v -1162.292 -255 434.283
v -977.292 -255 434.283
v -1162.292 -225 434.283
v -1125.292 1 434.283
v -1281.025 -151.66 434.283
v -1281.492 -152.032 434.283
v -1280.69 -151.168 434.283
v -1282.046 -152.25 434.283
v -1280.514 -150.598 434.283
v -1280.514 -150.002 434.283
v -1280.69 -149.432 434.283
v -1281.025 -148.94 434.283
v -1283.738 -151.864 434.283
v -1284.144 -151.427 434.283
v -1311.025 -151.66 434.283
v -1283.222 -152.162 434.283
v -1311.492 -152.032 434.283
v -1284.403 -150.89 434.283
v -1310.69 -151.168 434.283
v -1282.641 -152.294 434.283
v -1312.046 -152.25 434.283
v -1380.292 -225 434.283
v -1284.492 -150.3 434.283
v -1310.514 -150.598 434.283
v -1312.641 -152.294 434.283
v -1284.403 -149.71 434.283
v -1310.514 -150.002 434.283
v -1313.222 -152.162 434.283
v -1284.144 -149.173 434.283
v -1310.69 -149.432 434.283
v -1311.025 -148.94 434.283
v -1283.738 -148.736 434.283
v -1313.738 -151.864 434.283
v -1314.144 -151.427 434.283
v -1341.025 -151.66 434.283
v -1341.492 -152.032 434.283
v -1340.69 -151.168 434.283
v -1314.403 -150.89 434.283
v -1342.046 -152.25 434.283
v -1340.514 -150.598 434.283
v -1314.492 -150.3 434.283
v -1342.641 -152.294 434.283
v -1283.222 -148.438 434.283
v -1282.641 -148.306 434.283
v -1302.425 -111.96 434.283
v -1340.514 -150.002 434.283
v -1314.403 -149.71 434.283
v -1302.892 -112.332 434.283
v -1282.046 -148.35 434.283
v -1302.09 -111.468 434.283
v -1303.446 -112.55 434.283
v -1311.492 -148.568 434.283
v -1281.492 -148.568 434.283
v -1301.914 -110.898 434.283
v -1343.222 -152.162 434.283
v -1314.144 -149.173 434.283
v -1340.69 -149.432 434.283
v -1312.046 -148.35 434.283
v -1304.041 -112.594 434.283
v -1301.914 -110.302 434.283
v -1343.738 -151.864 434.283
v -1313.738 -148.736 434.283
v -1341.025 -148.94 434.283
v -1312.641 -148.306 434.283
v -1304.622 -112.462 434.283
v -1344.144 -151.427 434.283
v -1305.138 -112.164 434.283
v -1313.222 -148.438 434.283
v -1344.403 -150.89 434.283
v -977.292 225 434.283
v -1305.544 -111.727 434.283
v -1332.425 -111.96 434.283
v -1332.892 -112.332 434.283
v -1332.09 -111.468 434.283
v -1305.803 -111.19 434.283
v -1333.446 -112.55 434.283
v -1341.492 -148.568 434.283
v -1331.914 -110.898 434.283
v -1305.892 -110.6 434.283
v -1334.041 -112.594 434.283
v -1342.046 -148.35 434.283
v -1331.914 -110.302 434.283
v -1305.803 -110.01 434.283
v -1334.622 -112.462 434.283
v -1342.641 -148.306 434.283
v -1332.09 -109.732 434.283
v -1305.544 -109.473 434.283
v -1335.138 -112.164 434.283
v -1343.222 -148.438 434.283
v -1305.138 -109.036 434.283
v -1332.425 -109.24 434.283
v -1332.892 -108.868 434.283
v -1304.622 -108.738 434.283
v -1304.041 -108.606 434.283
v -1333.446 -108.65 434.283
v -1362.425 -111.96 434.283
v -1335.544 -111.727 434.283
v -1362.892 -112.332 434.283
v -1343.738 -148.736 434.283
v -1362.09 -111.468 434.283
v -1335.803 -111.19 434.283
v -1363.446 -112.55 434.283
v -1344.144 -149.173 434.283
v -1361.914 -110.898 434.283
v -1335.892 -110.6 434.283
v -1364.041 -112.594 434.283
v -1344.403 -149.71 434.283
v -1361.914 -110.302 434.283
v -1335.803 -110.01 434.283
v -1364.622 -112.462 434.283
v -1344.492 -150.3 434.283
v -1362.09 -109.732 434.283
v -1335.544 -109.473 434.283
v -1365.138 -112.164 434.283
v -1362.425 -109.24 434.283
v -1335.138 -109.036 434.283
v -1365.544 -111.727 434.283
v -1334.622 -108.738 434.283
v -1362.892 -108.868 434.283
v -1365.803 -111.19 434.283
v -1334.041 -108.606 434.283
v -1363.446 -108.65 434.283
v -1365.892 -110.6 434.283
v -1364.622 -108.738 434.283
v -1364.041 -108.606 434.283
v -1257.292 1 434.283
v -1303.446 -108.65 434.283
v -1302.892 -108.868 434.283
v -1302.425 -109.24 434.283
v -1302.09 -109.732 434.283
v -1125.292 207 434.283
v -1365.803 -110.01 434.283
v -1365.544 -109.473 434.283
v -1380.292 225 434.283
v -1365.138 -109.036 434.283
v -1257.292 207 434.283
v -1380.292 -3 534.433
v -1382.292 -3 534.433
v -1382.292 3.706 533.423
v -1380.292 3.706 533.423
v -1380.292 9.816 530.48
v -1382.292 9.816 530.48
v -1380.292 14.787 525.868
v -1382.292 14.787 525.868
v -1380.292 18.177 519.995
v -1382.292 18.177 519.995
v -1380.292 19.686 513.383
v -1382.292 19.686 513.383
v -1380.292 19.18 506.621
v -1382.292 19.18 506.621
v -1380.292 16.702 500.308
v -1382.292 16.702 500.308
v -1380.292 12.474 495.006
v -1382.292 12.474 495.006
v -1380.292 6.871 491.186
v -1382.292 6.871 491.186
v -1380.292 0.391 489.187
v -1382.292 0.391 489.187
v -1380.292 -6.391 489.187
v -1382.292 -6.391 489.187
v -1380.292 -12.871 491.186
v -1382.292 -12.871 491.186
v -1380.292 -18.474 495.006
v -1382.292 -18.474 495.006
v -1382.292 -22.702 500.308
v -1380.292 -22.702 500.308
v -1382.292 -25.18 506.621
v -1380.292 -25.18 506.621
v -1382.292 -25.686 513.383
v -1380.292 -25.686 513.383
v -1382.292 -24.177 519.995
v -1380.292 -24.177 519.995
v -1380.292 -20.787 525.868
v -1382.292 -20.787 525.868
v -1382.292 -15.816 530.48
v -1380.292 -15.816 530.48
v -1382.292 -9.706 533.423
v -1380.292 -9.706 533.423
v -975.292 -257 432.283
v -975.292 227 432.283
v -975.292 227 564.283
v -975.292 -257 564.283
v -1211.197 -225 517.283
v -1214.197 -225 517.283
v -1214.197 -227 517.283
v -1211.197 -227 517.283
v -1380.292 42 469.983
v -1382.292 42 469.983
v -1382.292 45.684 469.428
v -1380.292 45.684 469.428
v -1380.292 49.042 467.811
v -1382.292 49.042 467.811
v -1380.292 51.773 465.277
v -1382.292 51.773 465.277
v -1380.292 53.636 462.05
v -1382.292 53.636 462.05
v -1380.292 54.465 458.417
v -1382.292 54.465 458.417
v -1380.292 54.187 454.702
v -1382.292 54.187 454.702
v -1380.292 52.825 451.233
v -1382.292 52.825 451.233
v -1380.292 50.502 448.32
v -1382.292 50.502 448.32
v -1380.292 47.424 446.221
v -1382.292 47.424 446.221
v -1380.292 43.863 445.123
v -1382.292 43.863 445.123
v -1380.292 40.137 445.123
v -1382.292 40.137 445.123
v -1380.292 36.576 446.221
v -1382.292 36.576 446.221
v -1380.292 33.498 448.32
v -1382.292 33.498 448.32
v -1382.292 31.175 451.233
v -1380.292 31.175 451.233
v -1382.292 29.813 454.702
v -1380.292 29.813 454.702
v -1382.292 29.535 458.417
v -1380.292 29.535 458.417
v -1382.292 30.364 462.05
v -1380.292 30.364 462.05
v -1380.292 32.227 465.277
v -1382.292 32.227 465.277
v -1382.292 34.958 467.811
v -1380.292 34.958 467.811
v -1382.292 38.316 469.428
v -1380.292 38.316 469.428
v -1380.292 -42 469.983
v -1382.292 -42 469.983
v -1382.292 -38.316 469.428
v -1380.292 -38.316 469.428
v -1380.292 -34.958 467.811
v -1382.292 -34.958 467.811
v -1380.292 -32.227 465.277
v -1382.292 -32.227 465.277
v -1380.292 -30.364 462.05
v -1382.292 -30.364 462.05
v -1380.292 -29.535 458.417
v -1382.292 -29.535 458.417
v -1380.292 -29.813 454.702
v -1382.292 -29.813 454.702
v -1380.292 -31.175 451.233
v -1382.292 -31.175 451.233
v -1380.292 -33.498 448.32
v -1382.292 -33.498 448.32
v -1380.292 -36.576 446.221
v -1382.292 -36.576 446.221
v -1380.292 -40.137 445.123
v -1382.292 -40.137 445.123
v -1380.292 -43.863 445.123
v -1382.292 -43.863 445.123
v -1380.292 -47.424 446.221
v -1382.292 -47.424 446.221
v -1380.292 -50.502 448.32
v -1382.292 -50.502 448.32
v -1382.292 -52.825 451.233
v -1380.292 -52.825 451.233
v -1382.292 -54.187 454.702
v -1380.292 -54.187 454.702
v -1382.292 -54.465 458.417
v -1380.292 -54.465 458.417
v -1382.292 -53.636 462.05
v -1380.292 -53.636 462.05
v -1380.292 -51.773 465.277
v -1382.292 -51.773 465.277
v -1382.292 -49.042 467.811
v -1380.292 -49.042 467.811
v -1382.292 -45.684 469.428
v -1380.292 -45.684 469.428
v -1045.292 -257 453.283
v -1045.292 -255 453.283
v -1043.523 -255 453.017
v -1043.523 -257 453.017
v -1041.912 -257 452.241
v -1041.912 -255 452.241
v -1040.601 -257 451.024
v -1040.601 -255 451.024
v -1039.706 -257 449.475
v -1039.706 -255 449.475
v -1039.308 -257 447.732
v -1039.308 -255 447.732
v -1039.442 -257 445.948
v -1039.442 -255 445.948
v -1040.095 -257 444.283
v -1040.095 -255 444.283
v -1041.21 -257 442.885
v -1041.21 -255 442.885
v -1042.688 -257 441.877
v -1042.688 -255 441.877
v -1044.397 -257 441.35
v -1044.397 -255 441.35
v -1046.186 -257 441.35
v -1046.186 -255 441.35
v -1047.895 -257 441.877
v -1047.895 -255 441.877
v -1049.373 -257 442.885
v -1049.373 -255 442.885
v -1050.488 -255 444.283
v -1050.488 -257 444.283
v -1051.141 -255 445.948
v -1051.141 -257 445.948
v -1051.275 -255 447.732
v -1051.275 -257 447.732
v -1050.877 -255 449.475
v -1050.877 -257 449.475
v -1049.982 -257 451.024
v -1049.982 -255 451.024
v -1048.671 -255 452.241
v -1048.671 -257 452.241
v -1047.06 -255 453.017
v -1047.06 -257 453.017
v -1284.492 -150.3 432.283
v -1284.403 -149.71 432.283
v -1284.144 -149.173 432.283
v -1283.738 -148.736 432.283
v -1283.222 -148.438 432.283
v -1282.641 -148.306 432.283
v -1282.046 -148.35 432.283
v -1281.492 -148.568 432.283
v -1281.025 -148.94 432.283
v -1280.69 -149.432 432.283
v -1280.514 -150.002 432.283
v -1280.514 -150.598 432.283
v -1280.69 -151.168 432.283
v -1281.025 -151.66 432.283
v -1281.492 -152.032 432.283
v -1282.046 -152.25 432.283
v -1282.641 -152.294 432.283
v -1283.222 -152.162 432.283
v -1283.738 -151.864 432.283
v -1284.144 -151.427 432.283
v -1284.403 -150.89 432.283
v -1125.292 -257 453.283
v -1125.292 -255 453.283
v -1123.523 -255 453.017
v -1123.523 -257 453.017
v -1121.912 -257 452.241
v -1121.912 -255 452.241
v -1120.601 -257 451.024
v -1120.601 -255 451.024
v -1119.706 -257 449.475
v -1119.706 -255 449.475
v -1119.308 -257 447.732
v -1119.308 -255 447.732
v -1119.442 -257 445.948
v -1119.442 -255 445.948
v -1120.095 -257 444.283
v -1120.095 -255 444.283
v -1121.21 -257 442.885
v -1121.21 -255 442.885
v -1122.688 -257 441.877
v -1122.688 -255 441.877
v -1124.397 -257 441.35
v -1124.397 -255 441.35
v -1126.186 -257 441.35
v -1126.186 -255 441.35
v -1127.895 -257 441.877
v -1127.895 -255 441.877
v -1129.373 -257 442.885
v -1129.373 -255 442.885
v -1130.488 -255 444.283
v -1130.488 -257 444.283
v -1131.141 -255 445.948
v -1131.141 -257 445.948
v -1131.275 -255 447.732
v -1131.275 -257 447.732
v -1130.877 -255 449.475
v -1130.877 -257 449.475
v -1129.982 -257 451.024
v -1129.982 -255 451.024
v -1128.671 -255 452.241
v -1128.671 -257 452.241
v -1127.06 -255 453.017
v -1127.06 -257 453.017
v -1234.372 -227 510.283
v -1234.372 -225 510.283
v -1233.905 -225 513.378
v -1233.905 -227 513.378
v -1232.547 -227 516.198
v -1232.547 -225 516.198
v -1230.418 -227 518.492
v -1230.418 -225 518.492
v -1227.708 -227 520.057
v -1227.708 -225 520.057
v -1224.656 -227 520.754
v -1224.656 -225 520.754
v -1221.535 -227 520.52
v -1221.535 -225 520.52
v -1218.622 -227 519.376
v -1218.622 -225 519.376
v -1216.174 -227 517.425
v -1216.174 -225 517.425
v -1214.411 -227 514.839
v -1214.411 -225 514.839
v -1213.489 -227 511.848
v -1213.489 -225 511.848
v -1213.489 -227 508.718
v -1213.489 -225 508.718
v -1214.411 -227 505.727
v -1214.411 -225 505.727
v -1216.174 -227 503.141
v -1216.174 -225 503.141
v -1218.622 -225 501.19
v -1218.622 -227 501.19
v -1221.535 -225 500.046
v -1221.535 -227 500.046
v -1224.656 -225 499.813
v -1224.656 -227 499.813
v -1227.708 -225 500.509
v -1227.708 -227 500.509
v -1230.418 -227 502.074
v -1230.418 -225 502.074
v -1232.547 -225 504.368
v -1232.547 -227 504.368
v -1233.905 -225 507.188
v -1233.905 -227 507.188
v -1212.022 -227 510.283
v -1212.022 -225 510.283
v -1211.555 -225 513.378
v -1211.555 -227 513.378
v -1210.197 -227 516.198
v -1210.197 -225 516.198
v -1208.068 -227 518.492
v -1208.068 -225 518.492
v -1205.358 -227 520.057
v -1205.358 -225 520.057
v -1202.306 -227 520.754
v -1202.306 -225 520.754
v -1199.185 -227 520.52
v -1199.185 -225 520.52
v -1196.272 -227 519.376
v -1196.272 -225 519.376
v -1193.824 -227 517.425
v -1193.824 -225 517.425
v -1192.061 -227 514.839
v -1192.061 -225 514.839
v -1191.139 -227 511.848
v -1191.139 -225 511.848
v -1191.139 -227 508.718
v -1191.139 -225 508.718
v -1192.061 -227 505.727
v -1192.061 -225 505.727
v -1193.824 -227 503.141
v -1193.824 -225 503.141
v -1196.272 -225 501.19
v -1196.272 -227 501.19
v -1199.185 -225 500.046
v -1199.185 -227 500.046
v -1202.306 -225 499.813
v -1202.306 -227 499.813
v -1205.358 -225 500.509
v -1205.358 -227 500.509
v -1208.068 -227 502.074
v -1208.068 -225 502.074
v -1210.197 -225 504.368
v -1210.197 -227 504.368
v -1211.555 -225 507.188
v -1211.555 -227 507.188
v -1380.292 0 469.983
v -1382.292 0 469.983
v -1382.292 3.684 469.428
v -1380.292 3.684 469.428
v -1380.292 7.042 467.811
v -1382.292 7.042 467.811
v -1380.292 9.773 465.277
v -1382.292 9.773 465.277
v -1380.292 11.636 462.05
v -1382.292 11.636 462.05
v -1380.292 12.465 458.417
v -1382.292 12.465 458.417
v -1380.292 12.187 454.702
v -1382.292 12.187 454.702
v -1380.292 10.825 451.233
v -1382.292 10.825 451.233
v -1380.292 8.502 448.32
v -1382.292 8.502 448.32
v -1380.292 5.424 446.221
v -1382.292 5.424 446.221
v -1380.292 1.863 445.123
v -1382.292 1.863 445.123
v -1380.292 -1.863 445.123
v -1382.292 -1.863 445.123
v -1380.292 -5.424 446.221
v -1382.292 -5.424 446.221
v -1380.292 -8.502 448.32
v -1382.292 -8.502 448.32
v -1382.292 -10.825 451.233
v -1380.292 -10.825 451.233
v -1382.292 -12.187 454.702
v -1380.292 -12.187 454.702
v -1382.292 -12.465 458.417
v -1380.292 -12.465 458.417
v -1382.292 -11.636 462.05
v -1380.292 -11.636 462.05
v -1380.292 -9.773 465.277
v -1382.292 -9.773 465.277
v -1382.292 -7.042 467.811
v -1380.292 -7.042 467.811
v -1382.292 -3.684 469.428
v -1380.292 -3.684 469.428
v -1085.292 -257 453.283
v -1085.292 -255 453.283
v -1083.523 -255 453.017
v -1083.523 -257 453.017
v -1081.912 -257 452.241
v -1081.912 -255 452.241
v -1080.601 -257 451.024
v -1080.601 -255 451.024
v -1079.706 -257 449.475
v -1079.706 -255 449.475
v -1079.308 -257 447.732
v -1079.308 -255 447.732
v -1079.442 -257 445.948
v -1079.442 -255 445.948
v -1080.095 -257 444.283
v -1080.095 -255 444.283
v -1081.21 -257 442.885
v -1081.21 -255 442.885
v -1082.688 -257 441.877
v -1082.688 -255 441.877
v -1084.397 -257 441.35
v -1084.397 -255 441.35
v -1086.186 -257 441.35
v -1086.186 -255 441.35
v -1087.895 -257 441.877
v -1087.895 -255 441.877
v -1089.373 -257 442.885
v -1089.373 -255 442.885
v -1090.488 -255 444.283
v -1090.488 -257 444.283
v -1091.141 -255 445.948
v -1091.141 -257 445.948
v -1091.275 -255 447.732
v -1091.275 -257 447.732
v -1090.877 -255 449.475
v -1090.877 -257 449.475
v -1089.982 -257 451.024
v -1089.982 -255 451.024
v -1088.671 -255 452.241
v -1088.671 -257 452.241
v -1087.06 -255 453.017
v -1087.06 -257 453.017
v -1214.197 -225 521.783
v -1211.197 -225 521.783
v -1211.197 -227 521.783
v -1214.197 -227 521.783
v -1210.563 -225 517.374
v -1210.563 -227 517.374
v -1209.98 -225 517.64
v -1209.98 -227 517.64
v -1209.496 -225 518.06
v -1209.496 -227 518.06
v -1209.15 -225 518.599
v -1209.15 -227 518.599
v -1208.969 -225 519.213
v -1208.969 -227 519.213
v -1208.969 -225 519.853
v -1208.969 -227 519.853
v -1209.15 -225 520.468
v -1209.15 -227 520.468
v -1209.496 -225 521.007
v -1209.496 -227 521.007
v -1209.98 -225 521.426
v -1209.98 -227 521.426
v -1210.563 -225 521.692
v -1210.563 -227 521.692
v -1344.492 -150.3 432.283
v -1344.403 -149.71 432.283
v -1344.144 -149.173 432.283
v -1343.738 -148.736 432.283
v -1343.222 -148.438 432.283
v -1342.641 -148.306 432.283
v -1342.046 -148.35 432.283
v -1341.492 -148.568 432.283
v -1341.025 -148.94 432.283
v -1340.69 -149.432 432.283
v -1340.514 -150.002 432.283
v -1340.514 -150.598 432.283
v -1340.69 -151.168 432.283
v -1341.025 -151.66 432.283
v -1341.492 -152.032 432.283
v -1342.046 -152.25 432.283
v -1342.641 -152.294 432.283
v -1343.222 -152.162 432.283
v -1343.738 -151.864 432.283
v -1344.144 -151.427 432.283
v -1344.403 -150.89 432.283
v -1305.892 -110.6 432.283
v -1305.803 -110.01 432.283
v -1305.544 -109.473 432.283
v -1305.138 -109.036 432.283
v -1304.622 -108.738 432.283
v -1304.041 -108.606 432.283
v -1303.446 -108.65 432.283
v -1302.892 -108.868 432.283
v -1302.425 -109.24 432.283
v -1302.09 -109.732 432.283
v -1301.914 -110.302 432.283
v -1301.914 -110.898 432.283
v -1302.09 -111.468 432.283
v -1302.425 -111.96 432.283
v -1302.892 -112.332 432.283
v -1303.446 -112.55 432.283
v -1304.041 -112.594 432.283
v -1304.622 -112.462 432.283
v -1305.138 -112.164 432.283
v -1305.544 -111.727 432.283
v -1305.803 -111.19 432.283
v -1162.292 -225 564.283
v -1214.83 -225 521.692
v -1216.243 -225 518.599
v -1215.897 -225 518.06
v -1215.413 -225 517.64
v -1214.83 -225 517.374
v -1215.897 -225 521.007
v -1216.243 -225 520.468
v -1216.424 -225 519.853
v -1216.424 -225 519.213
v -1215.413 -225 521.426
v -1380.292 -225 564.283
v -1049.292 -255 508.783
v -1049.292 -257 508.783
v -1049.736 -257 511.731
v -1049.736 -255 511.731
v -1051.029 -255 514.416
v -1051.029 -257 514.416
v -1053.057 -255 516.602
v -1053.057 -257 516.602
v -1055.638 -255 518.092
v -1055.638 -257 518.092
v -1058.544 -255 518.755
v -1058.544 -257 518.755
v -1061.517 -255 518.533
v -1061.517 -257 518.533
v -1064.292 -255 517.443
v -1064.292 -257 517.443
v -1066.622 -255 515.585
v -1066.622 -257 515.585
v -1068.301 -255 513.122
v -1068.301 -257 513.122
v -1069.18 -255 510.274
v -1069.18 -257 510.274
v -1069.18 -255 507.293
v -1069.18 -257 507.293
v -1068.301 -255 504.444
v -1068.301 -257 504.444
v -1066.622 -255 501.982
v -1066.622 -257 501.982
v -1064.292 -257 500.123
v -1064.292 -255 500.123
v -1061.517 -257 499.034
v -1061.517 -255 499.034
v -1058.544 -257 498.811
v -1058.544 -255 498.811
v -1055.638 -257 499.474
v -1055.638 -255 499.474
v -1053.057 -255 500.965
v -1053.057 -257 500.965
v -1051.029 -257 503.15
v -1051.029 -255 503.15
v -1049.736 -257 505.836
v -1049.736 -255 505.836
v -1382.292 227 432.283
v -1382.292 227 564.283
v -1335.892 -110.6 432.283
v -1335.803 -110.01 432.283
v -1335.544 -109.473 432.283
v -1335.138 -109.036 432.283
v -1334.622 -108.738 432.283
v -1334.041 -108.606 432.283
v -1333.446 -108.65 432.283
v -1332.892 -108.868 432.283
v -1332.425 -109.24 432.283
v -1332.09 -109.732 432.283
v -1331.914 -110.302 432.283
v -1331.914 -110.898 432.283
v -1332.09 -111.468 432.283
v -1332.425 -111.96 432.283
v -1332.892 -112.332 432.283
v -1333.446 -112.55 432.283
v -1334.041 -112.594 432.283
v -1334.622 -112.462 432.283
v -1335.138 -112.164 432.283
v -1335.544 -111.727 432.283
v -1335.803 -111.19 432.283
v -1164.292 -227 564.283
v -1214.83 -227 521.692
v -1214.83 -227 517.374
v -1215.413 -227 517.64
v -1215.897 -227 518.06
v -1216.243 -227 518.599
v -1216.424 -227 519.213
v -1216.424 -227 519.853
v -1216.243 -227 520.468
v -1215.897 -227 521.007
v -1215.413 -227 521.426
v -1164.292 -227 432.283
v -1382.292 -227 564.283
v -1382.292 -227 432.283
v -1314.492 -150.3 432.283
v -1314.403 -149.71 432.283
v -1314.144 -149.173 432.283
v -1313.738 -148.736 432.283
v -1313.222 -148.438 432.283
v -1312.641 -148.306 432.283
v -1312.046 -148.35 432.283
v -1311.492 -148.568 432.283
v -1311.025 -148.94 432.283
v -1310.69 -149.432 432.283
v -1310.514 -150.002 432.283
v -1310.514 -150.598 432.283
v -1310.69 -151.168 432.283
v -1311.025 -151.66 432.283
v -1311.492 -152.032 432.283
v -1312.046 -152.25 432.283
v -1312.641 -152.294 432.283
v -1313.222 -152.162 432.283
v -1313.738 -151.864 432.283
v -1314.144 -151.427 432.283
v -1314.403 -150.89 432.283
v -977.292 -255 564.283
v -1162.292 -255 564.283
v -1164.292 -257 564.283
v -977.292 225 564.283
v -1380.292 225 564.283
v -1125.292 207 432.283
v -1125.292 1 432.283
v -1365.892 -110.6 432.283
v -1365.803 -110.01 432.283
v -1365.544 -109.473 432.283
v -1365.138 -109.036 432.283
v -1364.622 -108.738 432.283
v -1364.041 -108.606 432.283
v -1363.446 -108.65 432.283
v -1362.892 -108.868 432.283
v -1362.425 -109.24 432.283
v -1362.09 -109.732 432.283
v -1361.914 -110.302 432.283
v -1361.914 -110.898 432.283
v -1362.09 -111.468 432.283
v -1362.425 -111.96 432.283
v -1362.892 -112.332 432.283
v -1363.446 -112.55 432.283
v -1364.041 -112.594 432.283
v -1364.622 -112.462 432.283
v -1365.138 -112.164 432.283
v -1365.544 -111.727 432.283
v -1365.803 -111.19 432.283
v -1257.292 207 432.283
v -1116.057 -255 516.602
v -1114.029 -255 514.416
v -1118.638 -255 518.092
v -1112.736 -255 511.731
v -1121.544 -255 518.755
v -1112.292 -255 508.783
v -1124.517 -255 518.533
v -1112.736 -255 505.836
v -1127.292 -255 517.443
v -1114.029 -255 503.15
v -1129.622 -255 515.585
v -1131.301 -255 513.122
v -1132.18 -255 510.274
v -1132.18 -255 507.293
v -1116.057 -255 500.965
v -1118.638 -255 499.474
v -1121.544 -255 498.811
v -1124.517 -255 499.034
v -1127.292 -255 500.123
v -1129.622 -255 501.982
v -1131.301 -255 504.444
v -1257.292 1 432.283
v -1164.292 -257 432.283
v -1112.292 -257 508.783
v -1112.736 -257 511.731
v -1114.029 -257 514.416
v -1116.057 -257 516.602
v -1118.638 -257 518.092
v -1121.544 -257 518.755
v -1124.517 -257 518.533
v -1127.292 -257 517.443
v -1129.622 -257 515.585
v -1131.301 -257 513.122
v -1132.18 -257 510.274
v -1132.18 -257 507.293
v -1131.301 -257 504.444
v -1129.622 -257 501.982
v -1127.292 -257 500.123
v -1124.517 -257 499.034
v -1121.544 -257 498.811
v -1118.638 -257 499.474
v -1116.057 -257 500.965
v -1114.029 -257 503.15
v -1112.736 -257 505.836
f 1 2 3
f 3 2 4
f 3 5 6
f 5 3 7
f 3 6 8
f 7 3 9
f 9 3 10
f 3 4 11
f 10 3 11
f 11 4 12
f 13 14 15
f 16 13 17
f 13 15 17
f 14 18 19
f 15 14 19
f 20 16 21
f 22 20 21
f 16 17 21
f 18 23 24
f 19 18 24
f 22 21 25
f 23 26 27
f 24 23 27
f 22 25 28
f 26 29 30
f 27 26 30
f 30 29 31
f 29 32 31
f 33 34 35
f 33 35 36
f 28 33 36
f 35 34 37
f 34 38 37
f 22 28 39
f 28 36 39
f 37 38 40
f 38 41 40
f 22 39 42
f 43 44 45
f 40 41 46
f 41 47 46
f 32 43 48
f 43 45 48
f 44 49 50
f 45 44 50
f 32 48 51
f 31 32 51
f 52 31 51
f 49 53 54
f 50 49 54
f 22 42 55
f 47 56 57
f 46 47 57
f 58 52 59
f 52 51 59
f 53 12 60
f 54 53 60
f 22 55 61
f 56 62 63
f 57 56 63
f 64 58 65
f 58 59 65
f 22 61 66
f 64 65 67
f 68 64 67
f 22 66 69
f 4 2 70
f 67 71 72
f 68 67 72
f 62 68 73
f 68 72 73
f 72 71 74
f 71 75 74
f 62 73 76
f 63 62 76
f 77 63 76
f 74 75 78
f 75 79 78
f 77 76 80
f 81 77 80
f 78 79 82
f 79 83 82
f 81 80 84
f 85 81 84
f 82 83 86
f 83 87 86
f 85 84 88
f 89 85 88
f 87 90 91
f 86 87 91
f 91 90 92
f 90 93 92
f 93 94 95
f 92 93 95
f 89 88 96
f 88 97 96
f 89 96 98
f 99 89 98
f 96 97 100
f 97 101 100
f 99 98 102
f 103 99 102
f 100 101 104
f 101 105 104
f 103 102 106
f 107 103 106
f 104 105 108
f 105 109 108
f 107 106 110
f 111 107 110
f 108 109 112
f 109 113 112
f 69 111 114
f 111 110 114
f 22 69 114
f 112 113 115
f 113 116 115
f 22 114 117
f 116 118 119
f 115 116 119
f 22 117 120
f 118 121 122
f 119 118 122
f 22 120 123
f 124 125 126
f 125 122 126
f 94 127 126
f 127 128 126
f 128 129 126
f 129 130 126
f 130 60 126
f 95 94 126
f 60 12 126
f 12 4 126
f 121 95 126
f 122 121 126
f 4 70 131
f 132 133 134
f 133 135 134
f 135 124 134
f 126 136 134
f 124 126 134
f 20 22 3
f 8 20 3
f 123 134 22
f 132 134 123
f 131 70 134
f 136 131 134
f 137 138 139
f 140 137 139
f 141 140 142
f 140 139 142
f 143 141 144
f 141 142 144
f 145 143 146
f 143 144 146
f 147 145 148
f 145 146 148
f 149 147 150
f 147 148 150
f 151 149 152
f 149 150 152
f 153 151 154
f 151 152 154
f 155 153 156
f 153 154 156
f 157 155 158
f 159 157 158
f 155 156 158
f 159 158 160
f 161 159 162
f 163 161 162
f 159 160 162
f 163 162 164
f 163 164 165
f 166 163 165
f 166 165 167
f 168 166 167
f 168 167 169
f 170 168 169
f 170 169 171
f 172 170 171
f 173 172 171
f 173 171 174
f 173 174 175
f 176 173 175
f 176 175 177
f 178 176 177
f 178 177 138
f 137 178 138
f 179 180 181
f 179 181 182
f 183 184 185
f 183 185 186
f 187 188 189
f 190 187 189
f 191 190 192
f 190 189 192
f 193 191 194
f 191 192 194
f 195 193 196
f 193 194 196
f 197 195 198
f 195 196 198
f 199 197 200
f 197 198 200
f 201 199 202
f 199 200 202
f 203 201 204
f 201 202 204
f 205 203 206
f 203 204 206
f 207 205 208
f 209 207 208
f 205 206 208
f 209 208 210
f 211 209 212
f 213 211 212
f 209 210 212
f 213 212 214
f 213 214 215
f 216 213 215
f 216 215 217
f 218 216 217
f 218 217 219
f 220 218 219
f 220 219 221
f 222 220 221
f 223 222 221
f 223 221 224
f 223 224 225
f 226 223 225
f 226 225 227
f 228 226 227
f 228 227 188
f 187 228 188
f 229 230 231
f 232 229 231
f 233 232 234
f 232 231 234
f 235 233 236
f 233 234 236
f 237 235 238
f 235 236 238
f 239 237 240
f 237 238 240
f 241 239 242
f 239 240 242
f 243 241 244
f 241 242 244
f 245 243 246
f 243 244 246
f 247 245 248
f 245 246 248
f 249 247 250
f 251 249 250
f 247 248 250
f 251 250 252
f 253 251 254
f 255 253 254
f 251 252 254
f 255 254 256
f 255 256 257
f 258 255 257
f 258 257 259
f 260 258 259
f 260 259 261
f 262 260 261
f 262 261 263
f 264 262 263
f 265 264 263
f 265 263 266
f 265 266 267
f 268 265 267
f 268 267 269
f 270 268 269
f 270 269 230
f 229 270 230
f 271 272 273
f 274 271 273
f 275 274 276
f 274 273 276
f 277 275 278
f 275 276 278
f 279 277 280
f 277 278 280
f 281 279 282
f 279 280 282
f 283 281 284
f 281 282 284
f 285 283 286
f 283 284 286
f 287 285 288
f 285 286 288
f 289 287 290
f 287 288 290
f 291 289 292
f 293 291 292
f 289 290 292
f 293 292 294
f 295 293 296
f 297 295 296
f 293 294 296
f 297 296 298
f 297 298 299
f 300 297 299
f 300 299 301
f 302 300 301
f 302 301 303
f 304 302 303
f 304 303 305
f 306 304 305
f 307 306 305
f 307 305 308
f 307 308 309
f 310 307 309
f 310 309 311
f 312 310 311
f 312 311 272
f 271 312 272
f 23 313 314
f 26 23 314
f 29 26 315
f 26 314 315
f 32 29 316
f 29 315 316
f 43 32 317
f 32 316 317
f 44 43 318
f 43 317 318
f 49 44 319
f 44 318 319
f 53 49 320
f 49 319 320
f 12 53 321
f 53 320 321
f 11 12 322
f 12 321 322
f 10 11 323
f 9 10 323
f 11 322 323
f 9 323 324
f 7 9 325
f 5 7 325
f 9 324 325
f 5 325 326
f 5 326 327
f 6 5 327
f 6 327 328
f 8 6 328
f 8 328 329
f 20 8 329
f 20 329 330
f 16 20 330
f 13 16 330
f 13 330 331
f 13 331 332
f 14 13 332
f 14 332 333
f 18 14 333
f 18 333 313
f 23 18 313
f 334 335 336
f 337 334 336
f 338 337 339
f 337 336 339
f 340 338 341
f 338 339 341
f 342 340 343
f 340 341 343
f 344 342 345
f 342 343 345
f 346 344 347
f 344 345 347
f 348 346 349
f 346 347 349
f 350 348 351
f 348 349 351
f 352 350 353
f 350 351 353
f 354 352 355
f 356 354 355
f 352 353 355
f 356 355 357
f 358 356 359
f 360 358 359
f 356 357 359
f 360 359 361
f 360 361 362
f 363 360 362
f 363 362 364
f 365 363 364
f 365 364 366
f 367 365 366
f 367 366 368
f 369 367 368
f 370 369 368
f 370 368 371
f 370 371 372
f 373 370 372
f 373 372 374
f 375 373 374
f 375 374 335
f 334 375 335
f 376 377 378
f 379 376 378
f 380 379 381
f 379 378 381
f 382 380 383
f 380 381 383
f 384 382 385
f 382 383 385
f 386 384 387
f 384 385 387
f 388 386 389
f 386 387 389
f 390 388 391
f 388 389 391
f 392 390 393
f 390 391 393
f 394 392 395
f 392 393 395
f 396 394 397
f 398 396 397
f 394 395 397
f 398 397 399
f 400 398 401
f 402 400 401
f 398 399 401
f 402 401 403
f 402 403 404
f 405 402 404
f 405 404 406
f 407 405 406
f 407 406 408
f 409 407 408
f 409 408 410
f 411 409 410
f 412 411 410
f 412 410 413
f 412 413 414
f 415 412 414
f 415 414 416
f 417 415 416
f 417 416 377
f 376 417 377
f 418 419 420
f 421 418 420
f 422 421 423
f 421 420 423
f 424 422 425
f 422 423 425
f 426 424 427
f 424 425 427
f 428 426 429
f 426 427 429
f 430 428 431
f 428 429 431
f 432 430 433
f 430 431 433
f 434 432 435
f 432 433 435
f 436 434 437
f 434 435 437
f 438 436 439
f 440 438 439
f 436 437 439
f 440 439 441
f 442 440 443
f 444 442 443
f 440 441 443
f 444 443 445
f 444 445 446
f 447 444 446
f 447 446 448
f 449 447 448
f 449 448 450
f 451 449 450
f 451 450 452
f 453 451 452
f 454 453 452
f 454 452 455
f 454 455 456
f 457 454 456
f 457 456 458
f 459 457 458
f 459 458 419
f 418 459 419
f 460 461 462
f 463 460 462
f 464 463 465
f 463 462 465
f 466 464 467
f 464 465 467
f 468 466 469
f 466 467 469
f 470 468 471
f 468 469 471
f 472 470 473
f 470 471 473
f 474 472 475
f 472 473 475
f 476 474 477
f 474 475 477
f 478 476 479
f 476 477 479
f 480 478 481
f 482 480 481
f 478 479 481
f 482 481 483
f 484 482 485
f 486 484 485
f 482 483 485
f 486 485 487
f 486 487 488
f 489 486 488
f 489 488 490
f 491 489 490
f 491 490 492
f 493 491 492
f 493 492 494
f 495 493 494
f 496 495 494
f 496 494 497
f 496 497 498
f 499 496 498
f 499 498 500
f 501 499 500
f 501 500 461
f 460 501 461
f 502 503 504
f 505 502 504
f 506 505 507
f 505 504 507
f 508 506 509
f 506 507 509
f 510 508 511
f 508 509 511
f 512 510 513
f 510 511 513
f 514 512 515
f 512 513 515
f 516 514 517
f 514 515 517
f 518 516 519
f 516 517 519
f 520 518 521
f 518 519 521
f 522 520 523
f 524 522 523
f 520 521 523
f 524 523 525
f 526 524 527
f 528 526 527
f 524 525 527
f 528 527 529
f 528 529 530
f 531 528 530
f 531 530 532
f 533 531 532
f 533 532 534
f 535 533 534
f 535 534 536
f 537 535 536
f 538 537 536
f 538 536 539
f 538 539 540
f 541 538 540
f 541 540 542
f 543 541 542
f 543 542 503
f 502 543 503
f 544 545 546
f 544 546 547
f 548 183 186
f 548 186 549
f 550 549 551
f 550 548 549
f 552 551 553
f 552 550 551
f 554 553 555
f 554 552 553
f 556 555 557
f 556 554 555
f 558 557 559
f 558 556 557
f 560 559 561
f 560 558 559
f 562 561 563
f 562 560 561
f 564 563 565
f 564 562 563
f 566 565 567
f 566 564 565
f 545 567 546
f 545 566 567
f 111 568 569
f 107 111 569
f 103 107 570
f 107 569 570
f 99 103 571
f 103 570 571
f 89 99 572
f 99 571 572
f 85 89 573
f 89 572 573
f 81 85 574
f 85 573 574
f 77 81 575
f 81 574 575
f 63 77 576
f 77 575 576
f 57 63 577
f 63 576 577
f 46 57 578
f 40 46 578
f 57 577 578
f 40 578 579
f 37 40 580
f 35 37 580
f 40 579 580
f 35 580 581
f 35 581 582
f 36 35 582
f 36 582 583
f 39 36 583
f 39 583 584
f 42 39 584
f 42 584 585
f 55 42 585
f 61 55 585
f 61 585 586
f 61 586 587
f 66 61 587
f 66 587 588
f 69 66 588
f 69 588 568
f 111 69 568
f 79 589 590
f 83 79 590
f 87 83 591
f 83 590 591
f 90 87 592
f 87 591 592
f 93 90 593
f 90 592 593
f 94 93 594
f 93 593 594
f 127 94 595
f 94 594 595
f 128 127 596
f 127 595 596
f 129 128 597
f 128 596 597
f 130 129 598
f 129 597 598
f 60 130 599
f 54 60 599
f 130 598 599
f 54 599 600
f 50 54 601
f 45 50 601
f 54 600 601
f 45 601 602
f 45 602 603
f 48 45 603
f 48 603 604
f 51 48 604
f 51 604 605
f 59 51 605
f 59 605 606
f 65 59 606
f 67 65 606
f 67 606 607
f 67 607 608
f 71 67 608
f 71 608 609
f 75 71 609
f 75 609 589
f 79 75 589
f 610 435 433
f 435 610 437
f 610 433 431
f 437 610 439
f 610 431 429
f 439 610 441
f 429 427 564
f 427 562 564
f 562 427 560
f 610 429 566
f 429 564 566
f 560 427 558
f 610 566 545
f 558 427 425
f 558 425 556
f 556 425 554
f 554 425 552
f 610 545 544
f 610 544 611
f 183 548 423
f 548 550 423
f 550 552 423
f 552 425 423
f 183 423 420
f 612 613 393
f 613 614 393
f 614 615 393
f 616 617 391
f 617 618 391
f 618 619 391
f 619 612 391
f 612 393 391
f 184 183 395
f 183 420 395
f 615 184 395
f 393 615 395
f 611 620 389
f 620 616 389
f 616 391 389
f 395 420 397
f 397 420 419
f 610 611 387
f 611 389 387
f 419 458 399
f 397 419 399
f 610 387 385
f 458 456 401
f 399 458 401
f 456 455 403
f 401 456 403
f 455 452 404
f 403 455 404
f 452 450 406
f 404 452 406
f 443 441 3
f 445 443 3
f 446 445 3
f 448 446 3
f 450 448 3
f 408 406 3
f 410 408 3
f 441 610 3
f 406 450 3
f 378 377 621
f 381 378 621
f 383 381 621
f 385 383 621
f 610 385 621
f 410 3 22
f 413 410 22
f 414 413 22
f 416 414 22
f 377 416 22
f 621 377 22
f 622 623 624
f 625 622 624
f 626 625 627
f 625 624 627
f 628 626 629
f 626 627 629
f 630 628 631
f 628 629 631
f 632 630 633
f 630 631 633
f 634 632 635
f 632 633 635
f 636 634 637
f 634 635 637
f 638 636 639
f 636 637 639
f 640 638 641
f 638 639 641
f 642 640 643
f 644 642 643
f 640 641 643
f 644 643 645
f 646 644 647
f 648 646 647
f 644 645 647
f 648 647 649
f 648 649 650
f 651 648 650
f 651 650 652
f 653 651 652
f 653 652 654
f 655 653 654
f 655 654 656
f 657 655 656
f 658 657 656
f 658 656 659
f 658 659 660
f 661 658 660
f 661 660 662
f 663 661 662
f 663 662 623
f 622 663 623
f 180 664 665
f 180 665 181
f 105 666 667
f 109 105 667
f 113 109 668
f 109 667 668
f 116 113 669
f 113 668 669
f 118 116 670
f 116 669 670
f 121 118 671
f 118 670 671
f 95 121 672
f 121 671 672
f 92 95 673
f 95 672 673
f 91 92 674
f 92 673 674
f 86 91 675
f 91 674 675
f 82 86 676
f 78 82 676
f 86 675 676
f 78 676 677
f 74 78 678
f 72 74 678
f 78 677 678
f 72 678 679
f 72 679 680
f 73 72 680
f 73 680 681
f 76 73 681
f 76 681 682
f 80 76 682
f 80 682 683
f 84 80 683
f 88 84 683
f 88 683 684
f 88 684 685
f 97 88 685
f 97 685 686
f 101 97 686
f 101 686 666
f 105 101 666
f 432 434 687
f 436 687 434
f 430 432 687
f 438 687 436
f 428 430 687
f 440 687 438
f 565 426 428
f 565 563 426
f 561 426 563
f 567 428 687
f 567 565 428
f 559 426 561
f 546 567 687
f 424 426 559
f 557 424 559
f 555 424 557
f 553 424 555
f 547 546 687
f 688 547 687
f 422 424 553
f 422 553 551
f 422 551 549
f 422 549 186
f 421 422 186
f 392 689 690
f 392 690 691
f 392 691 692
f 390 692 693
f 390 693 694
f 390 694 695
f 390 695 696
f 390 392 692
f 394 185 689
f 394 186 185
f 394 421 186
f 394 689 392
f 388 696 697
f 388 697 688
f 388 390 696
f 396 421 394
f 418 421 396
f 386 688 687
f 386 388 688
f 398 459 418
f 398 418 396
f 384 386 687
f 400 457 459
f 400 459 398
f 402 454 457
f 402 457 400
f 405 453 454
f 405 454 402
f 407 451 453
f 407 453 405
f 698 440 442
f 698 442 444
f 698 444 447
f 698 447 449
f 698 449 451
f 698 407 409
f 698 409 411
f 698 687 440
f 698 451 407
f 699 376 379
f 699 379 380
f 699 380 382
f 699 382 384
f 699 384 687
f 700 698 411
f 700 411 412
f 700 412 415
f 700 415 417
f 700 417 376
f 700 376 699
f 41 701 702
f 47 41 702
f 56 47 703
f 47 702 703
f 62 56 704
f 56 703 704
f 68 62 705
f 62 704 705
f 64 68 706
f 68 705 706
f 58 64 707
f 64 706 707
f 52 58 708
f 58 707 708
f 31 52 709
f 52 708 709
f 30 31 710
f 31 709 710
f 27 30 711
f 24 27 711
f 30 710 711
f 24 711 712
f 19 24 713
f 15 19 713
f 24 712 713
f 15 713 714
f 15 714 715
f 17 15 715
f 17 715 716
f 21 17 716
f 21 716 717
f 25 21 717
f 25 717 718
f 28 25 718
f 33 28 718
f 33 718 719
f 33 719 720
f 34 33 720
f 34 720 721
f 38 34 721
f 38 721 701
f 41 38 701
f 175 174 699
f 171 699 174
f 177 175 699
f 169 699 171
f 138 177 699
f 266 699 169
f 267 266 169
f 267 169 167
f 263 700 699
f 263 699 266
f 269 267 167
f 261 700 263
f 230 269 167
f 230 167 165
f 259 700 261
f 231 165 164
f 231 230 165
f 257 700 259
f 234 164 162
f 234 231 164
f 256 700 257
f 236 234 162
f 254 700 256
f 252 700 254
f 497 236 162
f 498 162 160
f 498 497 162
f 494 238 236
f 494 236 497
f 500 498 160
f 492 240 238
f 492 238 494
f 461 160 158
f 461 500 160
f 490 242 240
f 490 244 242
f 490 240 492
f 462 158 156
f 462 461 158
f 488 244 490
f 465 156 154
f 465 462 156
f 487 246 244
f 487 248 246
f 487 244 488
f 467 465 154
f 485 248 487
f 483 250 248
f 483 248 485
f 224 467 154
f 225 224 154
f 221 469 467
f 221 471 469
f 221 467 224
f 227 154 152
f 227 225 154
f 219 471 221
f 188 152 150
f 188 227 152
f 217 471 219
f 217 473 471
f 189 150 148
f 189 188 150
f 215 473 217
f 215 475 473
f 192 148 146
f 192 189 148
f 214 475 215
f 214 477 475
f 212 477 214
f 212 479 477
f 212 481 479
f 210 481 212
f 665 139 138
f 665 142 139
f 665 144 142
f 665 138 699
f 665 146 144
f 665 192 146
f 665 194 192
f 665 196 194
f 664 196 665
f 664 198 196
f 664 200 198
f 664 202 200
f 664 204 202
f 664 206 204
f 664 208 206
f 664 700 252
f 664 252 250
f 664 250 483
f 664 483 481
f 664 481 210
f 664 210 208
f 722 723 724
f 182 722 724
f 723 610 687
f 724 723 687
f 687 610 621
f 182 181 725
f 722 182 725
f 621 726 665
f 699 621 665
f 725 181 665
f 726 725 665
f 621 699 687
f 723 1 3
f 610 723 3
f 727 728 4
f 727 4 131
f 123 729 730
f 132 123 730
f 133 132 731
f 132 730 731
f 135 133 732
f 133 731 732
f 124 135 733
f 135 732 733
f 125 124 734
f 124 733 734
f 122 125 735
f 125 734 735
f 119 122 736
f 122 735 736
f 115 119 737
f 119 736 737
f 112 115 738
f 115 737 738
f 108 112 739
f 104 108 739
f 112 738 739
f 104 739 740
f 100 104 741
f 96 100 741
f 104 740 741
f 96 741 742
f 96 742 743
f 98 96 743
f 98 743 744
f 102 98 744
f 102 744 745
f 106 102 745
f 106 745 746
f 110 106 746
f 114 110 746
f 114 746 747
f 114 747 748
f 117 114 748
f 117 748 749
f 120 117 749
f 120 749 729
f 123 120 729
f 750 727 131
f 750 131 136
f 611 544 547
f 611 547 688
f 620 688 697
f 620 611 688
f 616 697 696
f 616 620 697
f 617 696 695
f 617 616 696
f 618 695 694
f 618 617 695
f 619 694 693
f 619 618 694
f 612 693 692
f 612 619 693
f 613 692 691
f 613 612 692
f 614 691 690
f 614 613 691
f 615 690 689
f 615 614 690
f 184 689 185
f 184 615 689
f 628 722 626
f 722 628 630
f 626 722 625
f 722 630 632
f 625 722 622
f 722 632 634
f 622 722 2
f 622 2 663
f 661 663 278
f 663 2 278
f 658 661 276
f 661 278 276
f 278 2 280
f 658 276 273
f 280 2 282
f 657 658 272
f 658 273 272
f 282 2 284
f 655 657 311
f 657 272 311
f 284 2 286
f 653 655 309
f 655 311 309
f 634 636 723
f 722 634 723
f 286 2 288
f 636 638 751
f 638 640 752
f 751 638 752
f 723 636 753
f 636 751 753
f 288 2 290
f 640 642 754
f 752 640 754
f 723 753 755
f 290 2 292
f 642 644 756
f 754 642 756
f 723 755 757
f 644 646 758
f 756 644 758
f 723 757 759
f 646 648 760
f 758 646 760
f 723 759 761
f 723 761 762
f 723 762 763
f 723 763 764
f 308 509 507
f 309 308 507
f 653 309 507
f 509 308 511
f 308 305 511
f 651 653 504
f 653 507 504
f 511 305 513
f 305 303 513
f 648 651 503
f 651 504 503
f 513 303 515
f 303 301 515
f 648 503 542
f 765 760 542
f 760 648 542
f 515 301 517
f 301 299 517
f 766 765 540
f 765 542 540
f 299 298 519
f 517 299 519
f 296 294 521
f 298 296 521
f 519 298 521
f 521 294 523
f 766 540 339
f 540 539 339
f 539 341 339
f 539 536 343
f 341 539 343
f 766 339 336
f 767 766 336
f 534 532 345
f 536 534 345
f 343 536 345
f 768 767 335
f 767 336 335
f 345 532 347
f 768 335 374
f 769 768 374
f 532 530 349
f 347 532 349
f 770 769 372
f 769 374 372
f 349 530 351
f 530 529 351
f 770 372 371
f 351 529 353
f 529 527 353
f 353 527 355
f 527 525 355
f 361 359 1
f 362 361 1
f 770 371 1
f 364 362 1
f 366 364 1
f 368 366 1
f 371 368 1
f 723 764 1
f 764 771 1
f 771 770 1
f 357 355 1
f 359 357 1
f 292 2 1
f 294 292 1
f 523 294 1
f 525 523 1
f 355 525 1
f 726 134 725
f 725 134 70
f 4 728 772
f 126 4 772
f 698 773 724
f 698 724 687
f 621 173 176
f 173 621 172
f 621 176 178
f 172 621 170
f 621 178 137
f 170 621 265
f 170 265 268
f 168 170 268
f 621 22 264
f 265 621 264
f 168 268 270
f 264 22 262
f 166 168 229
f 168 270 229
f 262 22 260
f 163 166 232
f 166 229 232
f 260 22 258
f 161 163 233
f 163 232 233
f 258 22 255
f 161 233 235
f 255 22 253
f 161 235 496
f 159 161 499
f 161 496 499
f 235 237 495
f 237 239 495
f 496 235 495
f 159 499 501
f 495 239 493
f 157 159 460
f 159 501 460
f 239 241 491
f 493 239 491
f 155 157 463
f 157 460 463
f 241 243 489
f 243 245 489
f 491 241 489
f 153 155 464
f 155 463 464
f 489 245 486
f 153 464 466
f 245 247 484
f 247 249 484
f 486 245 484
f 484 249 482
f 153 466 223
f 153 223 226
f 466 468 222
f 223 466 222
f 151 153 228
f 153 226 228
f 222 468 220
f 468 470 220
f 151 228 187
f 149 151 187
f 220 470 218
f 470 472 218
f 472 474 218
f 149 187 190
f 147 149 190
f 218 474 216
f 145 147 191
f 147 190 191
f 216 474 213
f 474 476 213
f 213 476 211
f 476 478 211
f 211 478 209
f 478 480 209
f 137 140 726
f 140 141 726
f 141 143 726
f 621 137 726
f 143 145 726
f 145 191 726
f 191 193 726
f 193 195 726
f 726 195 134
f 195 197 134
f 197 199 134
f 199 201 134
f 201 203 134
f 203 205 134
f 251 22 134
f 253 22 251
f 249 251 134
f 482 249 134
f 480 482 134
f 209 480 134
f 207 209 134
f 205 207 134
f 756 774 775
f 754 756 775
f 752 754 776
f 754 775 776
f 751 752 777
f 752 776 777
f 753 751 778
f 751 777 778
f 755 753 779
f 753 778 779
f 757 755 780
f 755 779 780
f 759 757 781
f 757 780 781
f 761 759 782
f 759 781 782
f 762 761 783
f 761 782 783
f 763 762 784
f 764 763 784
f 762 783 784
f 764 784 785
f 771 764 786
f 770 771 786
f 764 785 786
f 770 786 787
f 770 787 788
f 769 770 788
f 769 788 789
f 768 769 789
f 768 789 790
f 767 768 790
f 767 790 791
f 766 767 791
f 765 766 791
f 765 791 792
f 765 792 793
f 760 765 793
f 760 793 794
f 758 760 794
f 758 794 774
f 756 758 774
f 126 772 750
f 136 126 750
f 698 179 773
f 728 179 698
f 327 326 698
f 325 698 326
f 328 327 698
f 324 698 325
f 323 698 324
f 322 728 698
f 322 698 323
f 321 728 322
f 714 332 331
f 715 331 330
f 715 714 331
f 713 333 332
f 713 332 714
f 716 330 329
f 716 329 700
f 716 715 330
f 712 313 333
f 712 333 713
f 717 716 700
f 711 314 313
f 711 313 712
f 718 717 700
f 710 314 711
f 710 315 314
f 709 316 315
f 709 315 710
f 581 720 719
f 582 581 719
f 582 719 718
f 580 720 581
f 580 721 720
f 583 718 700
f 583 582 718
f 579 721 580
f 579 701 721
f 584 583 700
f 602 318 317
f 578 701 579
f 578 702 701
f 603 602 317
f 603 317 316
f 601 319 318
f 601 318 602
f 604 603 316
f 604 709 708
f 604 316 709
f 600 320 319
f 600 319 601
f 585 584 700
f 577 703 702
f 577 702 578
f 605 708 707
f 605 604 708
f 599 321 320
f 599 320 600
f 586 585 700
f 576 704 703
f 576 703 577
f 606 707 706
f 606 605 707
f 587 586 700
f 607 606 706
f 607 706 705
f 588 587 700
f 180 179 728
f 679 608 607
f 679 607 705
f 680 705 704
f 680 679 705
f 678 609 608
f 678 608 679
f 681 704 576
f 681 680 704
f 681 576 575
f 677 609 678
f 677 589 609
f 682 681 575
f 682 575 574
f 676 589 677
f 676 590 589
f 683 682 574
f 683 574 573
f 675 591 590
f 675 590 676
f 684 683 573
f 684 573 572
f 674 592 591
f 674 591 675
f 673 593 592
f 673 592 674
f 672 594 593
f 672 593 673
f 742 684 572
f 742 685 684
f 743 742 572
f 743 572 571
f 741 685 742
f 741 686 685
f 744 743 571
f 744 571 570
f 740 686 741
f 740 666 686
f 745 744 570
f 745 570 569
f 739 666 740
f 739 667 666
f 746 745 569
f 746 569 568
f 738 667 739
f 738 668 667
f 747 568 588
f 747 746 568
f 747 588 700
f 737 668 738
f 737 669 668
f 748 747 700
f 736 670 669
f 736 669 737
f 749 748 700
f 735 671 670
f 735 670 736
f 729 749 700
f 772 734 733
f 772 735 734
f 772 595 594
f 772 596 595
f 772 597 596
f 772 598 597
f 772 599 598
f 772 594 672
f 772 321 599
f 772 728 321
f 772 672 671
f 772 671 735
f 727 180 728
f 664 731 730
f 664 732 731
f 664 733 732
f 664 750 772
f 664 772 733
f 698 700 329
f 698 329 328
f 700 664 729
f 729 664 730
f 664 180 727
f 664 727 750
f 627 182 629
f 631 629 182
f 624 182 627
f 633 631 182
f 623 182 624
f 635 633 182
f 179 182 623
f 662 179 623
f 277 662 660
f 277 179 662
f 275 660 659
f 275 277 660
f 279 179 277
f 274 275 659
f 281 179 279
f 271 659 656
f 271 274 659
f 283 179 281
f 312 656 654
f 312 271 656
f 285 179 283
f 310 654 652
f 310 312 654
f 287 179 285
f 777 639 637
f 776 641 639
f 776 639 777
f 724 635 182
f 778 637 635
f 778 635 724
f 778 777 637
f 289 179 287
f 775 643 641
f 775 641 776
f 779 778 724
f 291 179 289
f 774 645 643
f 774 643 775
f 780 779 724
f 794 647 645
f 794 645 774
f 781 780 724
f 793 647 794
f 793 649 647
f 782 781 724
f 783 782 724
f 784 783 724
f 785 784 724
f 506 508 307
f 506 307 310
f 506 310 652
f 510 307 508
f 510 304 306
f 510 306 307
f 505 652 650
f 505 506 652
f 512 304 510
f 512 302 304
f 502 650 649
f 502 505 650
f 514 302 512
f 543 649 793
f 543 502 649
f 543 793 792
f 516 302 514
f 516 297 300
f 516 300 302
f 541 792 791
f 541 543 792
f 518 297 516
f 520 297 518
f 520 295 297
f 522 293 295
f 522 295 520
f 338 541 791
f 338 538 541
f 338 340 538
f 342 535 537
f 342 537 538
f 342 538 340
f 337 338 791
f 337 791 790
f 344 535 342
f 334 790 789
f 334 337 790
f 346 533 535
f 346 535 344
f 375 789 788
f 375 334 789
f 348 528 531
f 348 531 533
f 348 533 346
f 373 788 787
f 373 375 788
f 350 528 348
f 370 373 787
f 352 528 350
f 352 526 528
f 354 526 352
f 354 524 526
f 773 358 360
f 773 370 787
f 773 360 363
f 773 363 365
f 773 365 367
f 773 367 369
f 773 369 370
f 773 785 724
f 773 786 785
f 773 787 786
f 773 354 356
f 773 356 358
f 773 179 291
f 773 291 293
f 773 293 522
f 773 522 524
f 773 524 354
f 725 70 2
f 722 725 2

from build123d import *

# Parameters (mm, degrees)
DODANIE_WYCI_GNI_CIE1_DEPTH     = 130
SKORUPA1_T                      = 2
WYTNIJ_WYCI_GNI_CIE1_REACH      = 1414.162
SZKIC6_W                        = 132
SZKIC6_H                        = 206
OTWORY_USTALAJ_CE_12_0MM1_D     = 12
OTWORY_USTALAJ_CE_12_0MM1_DEPTH = 2
SZKIC10_R                       = 12.5
SZKIC10_R_2                     = 22.75
WYTNIJ_WYCI_GNI_CIE2_DEPTH      = 10
SZKIC8_R                        = 10
WYTNIJ_WYCI_GNI_CIE3_DEPTH      = 10
SZKIC11_R                       = 2
WYTNIJ_WYCI_GNI_CIE4_DEPTH      = 10
SZKIC12_R                       = 10.5
WYTNIJ_WYCI_GNI_CIE5_DEPTH      = 10


with BuildPart() as part:
    # Szkic1 → Dodanie-wyciągnięcie1 (new body)
    with BuildSketch(Plane.XY.offset(434.283231707)):
        Polygon((-977.291509632, 225), (-977.291509632, -255), (-1162.291509632, -255), (-1162.291509632, -225), (-1380.291509632, -225), (-1380.291509632, 225), align=None)
    extrude(amount=DODANIE_WYCI_GNI_CIE1_DEPTH)

    # Skorupa1
    skorupa1_openings = [part.faces().sort_by_distance(p)[0] for p in [
        (-1175.554752008, -7.126805778, 564.283231707),
    ]]
    offset(amount=SKORUPA1_T, openings=skorupa1_openings, kind=Kind.INTERSECTION)

    # Szkic6 → Wytnij-wyciągnięcie1 (cut, up to next)
    with BuildSketch(Plane(origin=(0, 0, 432.283231707), x_dir=(-1, 0, 0), z_dir=(0, 0, -1)), mode=Mode.PRIVATE) as wytnij_wyci_gni_cie1_sk1:
        with Locations((1191.291509632, 104)):
            Rectangle(SZKIC6_W, SZKIC6_H)
    wytnij_wyci_gni_cie1_tool1 = extrude(wytnij_wyci_gni_cie1_sk1.sketch, amount=-WYTNIJ_WYCI_GNI_CIE1_REACH, mode=Mode.PRIVATE) & part.part
    add(wytnij_wyci_gni_cie1_tool1.solids().sort_by_distance((-1191.29151, 104, 432.283232))[0], mode=Mode.SUBTRACT)

    # Otwory ustalające Ø12.0mm1
    with Locations(Plane(origin=(-1125.291509632, -257, 447.283231707), x_dir=(0, 0, -1), z_dir=(0, -1, 0))):
        with Locations((0, 0), (0, 40), (0, 80)):
            Hole(OTWORY_USTALAJ_CE_12_0MM1_D / 2, depth=OTWORY_USTALAJ_CE_12_0MM1_DEPTH)

    # Szkic10 → Wytnij-wyciągnięcie2 (cut)
    with BuildSketch(Plane.ZY.offset(1382.291509632)):
        with Locations((457.483231707, 42)):
            Circle(SZKIC10_R)
        with Locations((457.483231707, 0)):
            Circle(SZKIC10_R)
        with Locations((457.483231707, -42)):
            Circle(SZKIC10_R)
        with Locations((511.683231707, -3)):
            Circle(SZKIC10_R_2)
    extrude(amount=-WYTNIJ_WYCI_GNI_CIE2_DEPTH, mode=Mode.SUBTRACT)

    # Szkic8 → Wytnij-wyciągnięcie3 (cut)
    with BuildSketch(Plane.XZ.offset(257)):
        with Locations((-1122.291509632, 508.783231707)):
            Circle(SZKIC8_R)
        with Locations((-1059.291509632, 508.783231707)):
            Circle(SZKIC8_R)
    extrude(amount=-WYTNIJ_WYCI_GNI_CIE3_DEPTH, mode=Mode.SUBTRACT)

    # Szkic11 → Wytnij-wyciągnięcie4 (cut)
    with BuildSketch(Plane(origin=(0, 0, 432.283231707), x_dir=(-1, 0, 0), z_dir=(0, 0, -1))):
        with Locations((1363.891509632, -110.6)):
            Circle(SZKIC11_R)
        with Locations((1342.491509632, -150.3)):
            Circle(SZKIC11_R)
        with Locations((1312.491509632, -150.3)):
            Circle(SZKIC11_R)
        with Locations((1333.891509632, -110.6)):
            Circle(SZKIC11_R)
        with Locations((1282.491509632, -150.3)):
            Circle(SZKIC11_R)
        with Locations((1303.891509632, -110.6)):
            Circle(SZKIC11_R)
    extrude(amount=-WYTNIJ_WYCI_GNI_CIE4_DEPTH, mode=Mode.SUBTRACT)

    # Szkic12 → Wytnij-wyciągnięcie5 (cut)
    with BuildSketch(Plane(origin=(0, -225, 0), x_dir=(1, 0, 0), z_dir=(0, 1, 0))):
        with Locations(Location((-1201.521509632, -510.283231707, 0), (0, 0, 180))):
            Circle(SZKIC12_R)
        with Locations(Location((-1223.871509632, -510.283231707, 0), (0, 0, 180))):
            Circle(SZKIC12_R)
        with BuildLine():
            Line((-1211.196509632, -521.783231707), (-1214.196509632, -521.783231707))
            ThreePointArc((-1214.196509632, -521.783231707), (-1216.446509632, -519.533231707), (-1214.196509632, -517.283231707))
            Line((-1214.196509632, -517.283231707), (-1211.196509632, -517.283231707))
            ThreePointArc((-1211.196509632, -517.283231707), (-1208.946509632, -519.533231707), (-1211.196509632, -521.783231707))
        make_face()
    extrude(amount=-WYTNIJ_WYCI_GNI_CIE5_DEPTH, mode=Mode.SUBTRACT)


solid = part.part
